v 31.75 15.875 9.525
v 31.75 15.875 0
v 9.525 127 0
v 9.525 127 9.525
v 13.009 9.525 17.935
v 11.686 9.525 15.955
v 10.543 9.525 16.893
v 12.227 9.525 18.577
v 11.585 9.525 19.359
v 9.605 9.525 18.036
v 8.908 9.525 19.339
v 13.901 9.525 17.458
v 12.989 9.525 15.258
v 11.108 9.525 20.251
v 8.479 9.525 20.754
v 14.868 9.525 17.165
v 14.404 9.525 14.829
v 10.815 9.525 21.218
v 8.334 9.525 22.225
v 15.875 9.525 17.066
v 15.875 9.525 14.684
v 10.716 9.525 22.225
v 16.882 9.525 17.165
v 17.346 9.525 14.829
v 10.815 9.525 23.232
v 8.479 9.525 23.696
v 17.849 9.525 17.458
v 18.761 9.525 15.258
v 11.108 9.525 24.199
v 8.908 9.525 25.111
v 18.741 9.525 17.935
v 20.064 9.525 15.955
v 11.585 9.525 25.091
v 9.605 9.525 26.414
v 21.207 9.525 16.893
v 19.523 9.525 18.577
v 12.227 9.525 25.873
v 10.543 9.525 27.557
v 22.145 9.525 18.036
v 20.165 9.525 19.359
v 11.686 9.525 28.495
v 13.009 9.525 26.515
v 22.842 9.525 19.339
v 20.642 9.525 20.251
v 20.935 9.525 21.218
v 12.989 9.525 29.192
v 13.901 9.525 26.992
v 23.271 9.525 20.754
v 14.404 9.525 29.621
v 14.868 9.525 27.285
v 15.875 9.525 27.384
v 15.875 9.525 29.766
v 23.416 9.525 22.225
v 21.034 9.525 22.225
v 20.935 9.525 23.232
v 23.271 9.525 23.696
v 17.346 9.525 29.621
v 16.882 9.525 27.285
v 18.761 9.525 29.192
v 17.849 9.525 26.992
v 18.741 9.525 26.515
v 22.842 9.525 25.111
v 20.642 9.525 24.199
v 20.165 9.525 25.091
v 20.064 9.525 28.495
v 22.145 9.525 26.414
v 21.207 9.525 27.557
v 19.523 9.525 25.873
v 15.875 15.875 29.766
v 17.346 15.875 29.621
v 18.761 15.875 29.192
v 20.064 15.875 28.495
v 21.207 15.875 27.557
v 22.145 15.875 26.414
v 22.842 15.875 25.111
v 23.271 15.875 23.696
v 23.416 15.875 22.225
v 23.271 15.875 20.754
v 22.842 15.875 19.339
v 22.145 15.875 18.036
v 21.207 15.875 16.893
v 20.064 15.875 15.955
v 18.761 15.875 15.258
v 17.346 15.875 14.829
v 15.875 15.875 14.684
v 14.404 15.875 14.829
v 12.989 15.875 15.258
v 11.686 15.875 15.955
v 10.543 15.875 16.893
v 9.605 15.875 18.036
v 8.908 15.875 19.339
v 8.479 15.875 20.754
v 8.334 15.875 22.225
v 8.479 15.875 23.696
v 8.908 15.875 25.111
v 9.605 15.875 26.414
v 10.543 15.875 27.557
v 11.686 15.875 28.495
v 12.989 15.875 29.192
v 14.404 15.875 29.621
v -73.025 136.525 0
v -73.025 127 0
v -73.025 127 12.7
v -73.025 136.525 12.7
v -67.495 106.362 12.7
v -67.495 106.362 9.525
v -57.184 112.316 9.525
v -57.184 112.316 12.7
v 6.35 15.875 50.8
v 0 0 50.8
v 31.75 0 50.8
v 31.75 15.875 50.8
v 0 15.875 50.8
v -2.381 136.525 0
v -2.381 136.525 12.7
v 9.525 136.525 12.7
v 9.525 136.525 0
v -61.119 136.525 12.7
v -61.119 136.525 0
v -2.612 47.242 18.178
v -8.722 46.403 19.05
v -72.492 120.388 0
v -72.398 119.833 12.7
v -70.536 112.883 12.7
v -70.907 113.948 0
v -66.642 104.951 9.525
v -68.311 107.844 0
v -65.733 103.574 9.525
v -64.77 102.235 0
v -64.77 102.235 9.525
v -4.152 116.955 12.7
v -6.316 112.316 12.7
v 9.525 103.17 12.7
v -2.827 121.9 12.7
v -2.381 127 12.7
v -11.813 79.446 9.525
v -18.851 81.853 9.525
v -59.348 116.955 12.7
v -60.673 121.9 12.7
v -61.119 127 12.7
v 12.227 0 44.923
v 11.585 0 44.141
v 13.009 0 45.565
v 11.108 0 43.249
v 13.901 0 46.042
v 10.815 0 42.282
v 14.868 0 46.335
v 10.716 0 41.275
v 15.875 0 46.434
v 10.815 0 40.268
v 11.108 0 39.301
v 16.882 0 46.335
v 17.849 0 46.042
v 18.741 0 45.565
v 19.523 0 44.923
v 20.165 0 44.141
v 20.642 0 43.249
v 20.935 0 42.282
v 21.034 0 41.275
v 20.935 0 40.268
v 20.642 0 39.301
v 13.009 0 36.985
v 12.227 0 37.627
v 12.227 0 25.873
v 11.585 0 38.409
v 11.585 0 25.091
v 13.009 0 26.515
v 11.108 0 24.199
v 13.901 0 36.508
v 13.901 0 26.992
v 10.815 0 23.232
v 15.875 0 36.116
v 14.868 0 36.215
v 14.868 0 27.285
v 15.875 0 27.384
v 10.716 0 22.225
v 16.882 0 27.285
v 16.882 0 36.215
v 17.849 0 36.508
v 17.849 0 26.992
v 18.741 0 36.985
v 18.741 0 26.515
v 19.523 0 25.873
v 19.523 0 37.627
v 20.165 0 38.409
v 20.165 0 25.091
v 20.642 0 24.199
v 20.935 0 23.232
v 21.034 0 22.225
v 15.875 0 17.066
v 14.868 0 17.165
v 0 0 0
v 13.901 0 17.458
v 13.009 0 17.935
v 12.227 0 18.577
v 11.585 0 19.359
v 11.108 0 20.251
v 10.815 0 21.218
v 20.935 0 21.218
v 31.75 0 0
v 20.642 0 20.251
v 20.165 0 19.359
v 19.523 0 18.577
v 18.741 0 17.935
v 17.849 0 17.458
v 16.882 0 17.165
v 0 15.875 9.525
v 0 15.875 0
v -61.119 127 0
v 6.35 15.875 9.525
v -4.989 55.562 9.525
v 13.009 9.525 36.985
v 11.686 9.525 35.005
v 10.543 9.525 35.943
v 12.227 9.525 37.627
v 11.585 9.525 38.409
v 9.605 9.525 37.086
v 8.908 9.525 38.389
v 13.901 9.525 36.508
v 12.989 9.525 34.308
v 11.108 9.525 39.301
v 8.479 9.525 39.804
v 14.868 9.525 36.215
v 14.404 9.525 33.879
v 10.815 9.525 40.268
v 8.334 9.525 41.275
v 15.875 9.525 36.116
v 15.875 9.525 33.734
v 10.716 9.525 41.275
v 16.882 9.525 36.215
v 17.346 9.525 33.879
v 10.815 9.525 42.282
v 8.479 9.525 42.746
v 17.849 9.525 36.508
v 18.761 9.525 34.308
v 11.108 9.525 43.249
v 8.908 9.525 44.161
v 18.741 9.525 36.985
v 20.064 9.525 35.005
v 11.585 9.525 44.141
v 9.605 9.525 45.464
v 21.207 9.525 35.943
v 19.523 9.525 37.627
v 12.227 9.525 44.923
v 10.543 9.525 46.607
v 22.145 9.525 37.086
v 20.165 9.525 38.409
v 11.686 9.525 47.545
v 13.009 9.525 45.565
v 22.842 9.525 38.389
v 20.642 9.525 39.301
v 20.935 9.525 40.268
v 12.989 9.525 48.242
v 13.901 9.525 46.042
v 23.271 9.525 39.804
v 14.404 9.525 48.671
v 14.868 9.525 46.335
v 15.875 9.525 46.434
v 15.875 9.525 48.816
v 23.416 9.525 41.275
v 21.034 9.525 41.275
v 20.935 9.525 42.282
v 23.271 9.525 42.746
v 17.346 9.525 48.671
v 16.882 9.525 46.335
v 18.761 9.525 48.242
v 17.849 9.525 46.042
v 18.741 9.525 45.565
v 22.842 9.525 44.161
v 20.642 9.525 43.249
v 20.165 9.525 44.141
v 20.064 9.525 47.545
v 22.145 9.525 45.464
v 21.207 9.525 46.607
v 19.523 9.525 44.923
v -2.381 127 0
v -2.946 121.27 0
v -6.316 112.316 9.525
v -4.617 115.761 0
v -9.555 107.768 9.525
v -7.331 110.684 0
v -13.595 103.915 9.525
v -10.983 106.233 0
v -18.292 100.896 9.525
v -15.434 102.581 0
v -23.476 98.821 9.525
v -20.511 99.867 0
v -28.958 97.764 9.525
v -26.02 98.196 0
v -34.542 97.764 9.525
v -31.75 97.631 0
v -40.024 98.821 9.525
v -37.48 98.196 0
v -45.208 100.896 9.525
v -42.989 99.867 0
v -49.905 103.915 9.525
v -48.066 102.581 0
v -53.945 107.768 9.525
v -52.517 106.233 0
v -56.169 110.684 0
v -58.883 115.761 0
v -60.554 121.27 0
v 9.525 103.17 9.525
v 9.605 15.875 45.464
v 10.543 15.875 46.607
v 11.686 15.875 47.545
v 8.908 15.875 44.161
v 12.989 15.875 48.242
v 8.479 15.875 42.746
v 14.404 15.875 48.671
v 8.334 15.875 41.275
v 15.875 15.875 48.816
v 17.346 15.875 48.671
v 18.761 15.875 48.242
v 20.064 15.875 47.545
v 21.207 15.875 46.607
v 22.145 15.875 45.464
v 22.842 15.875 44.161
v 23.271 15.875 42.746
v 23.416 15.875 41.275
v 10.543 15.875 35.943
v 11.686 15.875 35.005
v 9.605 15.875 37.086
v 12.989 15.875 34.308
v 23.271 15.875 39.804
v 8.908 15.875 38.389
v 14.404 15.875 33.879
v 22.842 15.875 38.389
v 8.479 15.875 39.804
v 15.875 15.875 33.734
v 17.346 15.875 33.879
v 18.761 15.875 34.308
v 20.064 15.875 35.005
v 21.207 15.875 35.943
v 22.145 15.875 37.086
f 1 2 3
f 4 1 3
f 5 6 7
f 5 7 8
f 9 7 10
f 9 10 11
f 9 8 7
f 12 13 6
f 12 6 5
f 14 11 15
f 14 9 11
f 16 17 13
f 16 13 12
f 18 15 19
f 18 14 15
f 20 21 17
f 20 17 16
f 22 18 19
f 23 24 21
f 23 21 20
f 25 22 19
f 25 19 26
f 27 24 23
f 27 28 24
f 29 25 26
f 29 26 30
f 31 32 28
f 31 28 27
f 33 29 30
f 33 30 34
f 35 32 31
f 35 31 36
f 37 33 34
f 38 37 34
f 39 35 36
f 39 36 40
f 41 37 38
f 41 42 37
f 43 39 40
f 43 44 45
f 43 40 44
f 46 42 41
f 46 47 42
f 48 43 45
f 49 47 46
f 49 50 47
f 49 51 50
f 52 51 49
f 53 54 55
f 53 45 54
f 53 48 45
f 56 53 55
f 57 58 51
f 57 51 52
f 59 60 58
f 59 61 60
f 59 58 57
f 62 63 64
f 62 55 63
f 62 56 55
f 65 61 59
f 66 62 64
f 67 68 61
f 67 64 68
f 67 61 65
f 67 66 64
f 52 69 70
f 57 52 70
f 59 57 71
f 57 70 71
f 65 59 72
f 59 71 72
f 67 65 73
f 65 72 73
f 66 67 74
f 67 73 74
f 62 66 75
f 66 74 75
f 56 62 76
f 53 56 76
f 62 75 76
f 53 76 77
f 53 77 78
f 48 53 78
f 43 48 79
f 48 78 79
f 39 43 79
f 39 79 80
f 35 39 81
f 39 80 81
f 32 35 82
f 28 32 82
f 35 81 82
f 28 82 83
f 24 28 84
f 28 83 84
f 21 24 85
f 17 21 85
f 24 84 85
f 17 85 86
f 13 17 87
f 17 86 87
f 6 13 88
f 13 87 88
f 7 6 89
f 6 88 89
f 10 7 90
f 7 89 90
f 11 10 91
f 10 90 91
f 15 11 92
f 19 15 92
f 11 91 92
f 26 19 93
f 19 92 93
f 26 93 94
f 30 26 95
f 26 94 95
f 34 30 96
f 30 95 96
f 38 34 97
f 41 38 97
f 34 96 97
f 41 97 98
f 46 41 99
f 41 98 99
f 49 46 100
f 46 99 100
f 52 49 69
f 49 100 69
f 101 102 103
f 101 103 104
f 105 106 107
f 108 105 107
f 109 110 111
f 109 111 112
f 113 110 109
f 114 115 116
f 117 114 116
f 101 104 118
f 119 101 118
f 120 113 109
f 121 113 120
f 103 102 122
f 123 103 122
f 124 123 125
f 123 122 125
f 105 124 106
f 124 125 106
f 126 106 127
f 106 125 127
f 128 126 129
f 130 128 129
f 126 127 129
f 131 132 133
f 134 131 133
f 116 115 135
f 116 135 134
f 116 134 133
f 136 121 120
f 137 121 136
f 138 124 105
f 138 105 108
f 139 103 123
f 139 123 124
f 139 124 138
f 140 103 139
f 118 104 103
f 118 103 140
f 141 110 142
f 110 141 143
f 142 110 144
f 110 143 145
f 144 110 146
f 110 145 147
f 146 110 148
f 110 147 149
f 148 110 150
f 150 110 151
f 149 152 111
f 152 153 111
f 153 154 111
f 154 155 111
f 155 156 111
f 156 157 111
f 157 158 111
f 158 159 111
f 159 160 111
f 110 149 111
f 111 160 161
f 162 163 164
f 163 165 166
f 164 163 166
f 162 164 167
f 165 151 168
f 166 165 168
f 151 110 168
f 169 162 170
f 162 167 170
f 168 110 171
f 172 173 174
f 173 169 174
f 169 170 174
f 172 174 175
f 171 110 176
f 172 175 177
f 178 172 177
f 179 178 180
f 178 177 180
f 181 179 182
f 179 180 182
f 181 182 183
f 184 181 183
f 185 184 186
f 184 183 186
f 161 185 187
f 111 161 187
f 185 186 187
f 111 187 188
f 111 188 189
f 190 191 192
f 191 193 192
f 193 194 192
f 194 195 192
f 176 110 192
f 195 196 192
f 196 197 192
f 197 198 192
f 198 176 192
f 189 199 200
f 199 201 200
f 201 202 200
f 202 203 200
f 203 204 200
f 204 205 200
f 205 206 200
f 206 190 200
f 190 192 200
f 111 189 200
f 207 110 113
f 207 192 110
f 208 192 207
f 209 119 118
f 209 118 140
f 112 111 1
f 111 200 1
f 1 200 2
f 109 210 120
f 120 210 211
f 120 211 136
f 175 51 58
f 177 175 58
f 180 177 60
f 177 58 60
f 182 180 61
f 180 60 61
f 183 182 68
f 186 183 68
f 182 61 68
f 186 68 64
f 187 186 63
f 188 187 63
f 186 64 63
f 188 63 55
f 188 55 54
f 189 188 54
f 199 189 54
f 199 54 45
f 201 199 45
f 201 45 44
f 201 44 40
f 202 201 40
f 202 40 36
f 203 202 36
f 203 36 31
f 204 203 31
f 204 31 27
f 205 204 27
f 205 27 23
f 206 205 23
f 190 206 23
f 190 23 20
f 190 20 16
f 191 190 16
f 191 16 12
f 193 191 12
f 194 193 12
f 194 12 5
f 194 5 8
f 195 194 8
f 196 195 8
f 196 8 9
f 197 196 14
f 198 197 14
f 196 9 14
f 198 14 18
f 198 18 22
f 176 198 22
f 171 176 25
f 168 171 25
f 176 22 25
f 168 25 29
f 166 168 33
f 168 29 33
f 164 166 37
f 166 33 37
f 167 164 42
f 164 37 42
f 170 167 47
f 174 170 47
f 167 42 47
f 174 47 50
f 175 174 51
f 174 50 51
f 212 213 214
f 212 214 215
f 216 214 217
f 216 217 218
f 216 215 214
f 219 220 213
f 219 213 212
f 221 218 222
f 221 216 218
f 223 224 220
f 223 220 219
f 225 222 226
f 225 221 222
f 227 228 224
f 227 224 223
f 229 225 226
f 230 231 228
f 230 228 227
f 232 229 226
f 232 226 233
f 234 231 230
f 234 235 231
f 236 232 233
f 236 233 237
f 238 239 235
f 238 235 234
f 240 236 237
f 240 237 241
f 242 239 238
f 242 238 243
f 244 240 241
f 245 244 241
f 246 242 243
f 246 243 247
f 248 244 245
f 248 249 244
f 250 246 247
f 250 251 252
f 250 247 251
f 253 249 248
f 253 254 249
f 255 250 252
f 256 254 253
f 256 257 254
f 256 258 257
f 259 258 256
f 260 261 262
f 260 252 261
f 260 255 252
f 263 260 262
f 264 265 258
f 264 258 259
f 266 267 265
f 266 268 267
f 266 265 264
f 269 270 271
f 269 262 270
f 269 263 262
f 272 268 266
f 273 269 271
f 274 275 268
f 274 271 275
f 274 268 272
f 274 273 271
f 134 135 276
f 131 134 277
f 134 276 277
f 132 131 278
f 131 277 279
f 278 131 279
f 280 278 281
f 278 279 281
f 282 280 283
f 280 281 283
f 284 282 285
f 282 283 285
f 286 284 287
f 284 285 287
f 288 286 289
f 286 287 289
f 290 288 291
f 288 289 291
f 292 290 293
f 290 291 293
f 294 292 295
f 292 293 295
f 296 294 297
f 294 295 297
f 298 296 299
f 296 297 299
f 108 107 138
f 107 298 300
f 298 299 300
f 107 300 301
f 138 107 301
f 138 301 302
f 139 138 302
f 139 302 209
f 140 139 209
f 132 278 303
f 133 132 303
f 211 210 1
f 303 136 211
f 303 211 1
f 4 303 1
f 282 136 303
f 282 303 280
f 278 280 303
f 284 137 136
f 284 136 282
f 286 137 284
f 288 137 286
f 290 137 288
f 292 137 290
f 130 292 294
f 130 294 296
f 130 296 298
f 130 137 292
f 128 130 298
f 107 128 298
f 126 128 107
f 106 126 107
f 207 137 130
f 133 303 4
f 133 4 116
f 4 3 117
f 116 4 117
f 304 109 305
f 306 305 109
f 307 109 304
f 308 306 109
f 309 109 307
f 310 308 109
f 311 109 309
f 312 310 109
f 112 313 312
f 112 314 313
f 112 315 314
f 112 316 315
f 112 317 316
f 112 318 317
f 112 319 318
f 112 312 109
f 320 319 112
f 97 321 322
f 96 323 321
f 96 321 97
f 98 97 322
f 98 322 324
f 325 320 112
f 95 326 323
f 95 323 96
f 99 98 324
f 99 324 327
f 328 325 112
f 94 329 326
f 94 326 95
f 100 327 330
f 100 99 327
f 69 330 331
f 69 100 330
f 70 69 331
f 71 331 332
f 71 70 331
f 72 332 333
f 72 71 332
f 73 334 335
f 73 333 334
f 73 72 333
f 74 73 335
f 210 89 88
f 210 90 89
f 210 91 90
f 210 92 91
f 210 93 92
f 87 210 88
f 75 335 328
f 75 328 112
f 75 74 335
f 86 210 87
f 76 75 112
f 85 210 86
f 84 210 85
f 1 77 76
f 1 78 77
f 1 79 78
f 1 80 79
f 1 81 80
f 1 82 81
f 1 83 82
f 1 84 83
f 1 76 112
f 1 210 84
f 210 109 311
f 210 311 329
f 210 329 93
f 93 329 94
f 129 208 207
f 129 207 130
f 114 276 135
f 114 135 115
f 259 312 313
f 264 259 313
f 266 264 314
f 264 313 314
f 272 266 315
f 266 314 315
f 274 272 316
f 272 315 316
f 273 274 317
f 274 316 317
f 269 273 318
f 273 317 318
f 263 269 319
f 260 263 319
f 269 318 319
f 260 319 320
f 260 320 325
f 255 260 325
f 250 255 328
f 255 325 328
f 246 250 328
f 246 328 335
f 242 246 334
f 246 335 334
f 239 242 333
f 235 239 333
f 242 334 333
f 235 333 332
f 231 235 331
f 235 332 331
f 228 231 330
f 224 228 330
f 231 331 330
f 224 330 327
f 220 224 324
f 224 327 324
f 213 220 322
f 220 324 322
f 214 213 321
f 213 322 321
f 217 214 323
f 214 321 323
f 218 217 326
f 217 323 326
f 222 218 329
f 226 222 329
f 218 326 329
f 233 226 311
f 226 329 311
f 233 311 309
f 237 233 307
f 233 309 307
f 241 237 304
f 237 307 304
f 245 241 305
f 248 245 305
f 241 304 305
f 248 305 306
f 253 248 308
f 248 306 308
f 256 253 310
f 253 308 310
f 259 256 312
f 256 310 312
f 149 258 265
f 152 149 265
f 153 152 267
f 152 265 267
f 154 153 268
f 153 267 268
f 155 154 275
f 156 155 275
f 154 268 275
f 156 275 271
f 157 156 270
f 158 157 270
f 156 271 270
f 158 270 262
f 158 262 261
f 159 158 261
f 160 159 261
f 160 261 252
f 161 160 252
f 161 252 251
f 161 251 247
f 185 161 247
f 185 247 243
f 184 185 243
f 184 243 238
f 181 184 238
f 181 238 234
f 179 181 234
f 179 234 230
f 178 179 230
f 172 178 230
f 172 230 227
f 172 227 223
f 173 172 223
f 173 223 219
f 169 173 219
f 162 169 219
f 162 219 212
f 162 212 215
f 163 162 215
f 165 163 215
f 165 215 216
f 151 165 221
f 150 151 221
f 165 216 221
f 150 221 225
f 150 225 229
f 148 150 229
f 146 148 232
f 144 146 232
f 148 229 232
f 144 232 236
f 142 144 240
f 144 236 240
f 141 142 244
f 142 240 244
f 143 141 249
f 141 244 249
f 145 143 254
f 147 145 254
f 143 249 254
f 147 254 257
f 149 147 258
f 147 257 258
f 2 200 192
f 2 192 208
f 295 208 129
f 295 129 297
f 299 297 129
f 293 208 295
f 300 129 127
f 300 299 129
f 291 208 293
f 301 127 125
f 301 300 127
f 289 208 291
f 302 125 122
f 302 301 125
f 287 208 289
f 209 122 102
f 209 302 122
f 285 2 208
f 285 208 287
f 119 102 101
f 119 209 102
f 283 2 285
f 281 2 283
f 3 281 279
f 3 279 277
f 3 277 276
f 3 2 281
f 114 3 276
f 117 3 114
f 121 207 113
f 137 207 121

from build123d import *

# Parameters (mm, degrees)
BOSS_EXTRUDE1_DEPTH = 9.525
RIB1_REACH          = 156.901
SKETCH3_WALL_W      = 425.12827586
SKETCH3_WALL_H      = 9.525
BOSS_EXTRUDE2_DEPTH = 12.7
SKETCH4_W           = 31.75
SKETCH4_H           = 15.875
BOSS_EXTRUDE3_DEPTH = 41.275
SKETCH10_W          = 41.275
SKETCH10_H          = 68.618379108
BOSS_EXTRUDE4_DEPTH = 6.35
CUT_EXTRUDE5_DEPTH  = 173.025545539
SKETCH14_R          = 7.540625
CUT_EXTRUDE6_DEPTH  = 6.35
SKETCH15_R          = 5.159375
CUT_EXTRUDE7_DEPTH  = 156.055766211


with BuildPart() as part:
    # Sketch1 → Boss-Extrude1 (new body)
    with BuildSketch(Plane.XY):
        with BuildLine():
            Line((0, 15.875), (0, 0))
            Line((0, 0), (31.75, 0))
            Line((31.75, 0), (31.75, 15.875))
            Line((31.75, 15.875), (9.525, 15.875))
            Line((9.525, 15.875), (9.525, 136.525))
            Line((9.525, 136.525), (-2.38125, 136.525))
            Line((-2.38125, 136.525), (-2.38125, 127))
            ThreePointArc((-2.38125, 127), (-31.75, 97.63125), (-61.11875, 127))
            Line((-61.11875, 127), (-61.11875, 136.525))
            Line((-61.11875, 136.525), (-73.025, 136.525))
            Line((-73.025, 136.525), (-73.025, 127))
            ThreePointArc((-73.025, 127), (-70.906903127, 113.947698958), (-64.77, 102.235))
            Line((-64.77, 102.235), (0, 15.875))
        make_face()
    extrude(amount=BOSS_EXTRUDE1_DEPTH)

    # Sketch3 wall → Rib1 (add, up to next)
    with BuildSketch(Plane(origin=(20.6375, 71.4375, 4.7625), x_dir=(-0.196116135138, 0.980580675691, 0), z_dir=(-0.980580675691, -0.196116135138, 0)), mode=Mode.PRIVATE) as rib1_sk1:
        Rectangle(SKETCH3_WALL_W, SKETCH3_WALL_H)
    rib1_tool1 = extrude(rib1_sk1.sketch, amount=RIB1_REACH, mode=Mode.PRIVATE) - part.part
    add(rib1_tool1.solids().sort_by_distance((20.6375, 71.4375, 4.7625))[0])

    # Sketch1<3> → Boss-Extrude2 (add)
    with BuildSketch(Plane.XY):
        with BuildLine():
            ThreePointArc((-73.025, 127), (-71.61858848, 116.317243913), (-67.495198541, 106.3625))
            Line((-67.495198541, 106.3625), (-57.184083577, 112.315625))
            ThreePointArc((-57.184083577, 112.315625), (-60.118034111, 119.398808169), (-61.11875, 127))
            Line((-61.11875, 127), (-61.11875, 136.525))
            Line((-61.11875, 136.525), (-73.025, 136.525))
            Line((-73.025, 136.525), (-73.025, 127))
        make_face()
        with BuildLine():
            Line((-6.315916423, 112.315625), (9.525, 103.169867639))
            Line((9.525, 103.169867639), (9.525, 136.525))
            Line((9.525, 136.525), (-2.38125, 136.525))
            Line((-2.38125, 136.525), (-2.38125, 127))
            ThreePointArc((-2.38125, 127), (-3.381965889, 119.398808169), (-6.315916423, 112.315625))
        make_face()
    extrude(amount=BOSS_EXTRUDE2_DEPTH)

    # Sketch4 → Boss-Extrude3 (add)
    with BuildSketch(Plane.XY.offset(9.525)):
        with Locations((15.875, 7.9375)):
            Rectangle(SKETCH4_W, SKETCH4_H)
    extrude(amount=BOSS_EXTRUDE3_DEPTH)

    # Sketch10 → Boss-Extrude4 (add, along a direction that is not the sketch's normal)
    with BuildSketch(Plane(origin=(4.193396226, 1.198113208, 0), x_dir=(0, 0, -1), z_dir=(0.9615239476408233, 0.2747211278973781, 0))):
        with Locations((-30.1625, 49.573382223)):
            Rectangle(SKETCH10_W, SKETCH10_H)
    extrude(amount=BOSS_EXTRUDE4_DEPTH, dir=(1, 0, 0))

    # Sketch11 → Cut-Extrude5 (cut, through all, along a direction that is not the sketch's normal)
    with BuildSketch(Plane(origin=(10.064150943, 2.875471698, 0), x_dir=(0, 0, -1), z_dir=(0.9615239476408232, 0.27472112789737807, 0))):
        Polygon((-50.8, 82.138092614), (-50.8, 13.519713507), (-19.05, 45.269713507), (-9.525, 54.794713507), (-9.525, 82.138092614), align=None)
    extrude(amount=-CUT_EXTRUDE5_DEPTH, dir=(1, 0, 0), mode=Mode.SUBTRACT)

    # Sketch13 → Loft2 section 0
    with BuildSketch(Plane(origin=(10.064150943, 2.875471698, 0), x_dir=(0, 0, -1), z_dir=(0.9615239476408232, 0.27472112789737807, 0))):
        with BuildLine():
            Line((-18.177760419, 46.141953088), (-8.652760419, 83.010332195))
            Line((-8.652760419, 83.010332195), (-9.525, 54.794713507))
            Line((-9.525, 54.794713507), (-18.177760419, 46.141953088))
        make_face()
    # Sketch12 → Loft2 section 1
    with BuildSketch(Plane(origin=(4.193396226, 1.198113208, 0), x_dir=(0, 0, -1), z_dir=(0.9615239476408233, 0.2747211278973781, 0))):
        with BuildLine():
            Line((-19.05, 47.014192669), (-9.525, 83.882571777))
            Line((-9.525, 83.882571777), (-9.525, 56.539192669))
            Line((-9.525, 56.539192669), (-19.05, 47.014192669))
        make_face()
    loft()

    # Sketch14 → Cut-Extrude6 (cut)
    with BuildSketch(Plane(origin=(0, 15.875, 0), x_dir=(1, 0, 0), z_dir=(0, 1, 0))):
        with Locations((15.875, -41.275)):
            Circle(SKETCH14_R)
        with Locations((15.875, -22.225)):
            Circle(SKETCH14_R)
    extrude(amount=-CUT_EXTRUDE6_DEPTH, mode=Mode.SUBTRACT)

    # Sketch15 → Cut-Extrude7 (cut, through all)
    with BuildSketch(Plane(origin=(0, 9.525, 0), x_dir=(1, 0, 0), z_dir=(0, 1, 0))):
        with Locations((15.875, -22.225)):
            Circle(SKETCH15_R)
        with Locations((15.875, -41.275)):
            Circle(SKETCH15_R)
    extrude(amount=-CUT_EXTRUDE7_DEPTH, mode=Mode.SUBTRACT)


solid = part.part
